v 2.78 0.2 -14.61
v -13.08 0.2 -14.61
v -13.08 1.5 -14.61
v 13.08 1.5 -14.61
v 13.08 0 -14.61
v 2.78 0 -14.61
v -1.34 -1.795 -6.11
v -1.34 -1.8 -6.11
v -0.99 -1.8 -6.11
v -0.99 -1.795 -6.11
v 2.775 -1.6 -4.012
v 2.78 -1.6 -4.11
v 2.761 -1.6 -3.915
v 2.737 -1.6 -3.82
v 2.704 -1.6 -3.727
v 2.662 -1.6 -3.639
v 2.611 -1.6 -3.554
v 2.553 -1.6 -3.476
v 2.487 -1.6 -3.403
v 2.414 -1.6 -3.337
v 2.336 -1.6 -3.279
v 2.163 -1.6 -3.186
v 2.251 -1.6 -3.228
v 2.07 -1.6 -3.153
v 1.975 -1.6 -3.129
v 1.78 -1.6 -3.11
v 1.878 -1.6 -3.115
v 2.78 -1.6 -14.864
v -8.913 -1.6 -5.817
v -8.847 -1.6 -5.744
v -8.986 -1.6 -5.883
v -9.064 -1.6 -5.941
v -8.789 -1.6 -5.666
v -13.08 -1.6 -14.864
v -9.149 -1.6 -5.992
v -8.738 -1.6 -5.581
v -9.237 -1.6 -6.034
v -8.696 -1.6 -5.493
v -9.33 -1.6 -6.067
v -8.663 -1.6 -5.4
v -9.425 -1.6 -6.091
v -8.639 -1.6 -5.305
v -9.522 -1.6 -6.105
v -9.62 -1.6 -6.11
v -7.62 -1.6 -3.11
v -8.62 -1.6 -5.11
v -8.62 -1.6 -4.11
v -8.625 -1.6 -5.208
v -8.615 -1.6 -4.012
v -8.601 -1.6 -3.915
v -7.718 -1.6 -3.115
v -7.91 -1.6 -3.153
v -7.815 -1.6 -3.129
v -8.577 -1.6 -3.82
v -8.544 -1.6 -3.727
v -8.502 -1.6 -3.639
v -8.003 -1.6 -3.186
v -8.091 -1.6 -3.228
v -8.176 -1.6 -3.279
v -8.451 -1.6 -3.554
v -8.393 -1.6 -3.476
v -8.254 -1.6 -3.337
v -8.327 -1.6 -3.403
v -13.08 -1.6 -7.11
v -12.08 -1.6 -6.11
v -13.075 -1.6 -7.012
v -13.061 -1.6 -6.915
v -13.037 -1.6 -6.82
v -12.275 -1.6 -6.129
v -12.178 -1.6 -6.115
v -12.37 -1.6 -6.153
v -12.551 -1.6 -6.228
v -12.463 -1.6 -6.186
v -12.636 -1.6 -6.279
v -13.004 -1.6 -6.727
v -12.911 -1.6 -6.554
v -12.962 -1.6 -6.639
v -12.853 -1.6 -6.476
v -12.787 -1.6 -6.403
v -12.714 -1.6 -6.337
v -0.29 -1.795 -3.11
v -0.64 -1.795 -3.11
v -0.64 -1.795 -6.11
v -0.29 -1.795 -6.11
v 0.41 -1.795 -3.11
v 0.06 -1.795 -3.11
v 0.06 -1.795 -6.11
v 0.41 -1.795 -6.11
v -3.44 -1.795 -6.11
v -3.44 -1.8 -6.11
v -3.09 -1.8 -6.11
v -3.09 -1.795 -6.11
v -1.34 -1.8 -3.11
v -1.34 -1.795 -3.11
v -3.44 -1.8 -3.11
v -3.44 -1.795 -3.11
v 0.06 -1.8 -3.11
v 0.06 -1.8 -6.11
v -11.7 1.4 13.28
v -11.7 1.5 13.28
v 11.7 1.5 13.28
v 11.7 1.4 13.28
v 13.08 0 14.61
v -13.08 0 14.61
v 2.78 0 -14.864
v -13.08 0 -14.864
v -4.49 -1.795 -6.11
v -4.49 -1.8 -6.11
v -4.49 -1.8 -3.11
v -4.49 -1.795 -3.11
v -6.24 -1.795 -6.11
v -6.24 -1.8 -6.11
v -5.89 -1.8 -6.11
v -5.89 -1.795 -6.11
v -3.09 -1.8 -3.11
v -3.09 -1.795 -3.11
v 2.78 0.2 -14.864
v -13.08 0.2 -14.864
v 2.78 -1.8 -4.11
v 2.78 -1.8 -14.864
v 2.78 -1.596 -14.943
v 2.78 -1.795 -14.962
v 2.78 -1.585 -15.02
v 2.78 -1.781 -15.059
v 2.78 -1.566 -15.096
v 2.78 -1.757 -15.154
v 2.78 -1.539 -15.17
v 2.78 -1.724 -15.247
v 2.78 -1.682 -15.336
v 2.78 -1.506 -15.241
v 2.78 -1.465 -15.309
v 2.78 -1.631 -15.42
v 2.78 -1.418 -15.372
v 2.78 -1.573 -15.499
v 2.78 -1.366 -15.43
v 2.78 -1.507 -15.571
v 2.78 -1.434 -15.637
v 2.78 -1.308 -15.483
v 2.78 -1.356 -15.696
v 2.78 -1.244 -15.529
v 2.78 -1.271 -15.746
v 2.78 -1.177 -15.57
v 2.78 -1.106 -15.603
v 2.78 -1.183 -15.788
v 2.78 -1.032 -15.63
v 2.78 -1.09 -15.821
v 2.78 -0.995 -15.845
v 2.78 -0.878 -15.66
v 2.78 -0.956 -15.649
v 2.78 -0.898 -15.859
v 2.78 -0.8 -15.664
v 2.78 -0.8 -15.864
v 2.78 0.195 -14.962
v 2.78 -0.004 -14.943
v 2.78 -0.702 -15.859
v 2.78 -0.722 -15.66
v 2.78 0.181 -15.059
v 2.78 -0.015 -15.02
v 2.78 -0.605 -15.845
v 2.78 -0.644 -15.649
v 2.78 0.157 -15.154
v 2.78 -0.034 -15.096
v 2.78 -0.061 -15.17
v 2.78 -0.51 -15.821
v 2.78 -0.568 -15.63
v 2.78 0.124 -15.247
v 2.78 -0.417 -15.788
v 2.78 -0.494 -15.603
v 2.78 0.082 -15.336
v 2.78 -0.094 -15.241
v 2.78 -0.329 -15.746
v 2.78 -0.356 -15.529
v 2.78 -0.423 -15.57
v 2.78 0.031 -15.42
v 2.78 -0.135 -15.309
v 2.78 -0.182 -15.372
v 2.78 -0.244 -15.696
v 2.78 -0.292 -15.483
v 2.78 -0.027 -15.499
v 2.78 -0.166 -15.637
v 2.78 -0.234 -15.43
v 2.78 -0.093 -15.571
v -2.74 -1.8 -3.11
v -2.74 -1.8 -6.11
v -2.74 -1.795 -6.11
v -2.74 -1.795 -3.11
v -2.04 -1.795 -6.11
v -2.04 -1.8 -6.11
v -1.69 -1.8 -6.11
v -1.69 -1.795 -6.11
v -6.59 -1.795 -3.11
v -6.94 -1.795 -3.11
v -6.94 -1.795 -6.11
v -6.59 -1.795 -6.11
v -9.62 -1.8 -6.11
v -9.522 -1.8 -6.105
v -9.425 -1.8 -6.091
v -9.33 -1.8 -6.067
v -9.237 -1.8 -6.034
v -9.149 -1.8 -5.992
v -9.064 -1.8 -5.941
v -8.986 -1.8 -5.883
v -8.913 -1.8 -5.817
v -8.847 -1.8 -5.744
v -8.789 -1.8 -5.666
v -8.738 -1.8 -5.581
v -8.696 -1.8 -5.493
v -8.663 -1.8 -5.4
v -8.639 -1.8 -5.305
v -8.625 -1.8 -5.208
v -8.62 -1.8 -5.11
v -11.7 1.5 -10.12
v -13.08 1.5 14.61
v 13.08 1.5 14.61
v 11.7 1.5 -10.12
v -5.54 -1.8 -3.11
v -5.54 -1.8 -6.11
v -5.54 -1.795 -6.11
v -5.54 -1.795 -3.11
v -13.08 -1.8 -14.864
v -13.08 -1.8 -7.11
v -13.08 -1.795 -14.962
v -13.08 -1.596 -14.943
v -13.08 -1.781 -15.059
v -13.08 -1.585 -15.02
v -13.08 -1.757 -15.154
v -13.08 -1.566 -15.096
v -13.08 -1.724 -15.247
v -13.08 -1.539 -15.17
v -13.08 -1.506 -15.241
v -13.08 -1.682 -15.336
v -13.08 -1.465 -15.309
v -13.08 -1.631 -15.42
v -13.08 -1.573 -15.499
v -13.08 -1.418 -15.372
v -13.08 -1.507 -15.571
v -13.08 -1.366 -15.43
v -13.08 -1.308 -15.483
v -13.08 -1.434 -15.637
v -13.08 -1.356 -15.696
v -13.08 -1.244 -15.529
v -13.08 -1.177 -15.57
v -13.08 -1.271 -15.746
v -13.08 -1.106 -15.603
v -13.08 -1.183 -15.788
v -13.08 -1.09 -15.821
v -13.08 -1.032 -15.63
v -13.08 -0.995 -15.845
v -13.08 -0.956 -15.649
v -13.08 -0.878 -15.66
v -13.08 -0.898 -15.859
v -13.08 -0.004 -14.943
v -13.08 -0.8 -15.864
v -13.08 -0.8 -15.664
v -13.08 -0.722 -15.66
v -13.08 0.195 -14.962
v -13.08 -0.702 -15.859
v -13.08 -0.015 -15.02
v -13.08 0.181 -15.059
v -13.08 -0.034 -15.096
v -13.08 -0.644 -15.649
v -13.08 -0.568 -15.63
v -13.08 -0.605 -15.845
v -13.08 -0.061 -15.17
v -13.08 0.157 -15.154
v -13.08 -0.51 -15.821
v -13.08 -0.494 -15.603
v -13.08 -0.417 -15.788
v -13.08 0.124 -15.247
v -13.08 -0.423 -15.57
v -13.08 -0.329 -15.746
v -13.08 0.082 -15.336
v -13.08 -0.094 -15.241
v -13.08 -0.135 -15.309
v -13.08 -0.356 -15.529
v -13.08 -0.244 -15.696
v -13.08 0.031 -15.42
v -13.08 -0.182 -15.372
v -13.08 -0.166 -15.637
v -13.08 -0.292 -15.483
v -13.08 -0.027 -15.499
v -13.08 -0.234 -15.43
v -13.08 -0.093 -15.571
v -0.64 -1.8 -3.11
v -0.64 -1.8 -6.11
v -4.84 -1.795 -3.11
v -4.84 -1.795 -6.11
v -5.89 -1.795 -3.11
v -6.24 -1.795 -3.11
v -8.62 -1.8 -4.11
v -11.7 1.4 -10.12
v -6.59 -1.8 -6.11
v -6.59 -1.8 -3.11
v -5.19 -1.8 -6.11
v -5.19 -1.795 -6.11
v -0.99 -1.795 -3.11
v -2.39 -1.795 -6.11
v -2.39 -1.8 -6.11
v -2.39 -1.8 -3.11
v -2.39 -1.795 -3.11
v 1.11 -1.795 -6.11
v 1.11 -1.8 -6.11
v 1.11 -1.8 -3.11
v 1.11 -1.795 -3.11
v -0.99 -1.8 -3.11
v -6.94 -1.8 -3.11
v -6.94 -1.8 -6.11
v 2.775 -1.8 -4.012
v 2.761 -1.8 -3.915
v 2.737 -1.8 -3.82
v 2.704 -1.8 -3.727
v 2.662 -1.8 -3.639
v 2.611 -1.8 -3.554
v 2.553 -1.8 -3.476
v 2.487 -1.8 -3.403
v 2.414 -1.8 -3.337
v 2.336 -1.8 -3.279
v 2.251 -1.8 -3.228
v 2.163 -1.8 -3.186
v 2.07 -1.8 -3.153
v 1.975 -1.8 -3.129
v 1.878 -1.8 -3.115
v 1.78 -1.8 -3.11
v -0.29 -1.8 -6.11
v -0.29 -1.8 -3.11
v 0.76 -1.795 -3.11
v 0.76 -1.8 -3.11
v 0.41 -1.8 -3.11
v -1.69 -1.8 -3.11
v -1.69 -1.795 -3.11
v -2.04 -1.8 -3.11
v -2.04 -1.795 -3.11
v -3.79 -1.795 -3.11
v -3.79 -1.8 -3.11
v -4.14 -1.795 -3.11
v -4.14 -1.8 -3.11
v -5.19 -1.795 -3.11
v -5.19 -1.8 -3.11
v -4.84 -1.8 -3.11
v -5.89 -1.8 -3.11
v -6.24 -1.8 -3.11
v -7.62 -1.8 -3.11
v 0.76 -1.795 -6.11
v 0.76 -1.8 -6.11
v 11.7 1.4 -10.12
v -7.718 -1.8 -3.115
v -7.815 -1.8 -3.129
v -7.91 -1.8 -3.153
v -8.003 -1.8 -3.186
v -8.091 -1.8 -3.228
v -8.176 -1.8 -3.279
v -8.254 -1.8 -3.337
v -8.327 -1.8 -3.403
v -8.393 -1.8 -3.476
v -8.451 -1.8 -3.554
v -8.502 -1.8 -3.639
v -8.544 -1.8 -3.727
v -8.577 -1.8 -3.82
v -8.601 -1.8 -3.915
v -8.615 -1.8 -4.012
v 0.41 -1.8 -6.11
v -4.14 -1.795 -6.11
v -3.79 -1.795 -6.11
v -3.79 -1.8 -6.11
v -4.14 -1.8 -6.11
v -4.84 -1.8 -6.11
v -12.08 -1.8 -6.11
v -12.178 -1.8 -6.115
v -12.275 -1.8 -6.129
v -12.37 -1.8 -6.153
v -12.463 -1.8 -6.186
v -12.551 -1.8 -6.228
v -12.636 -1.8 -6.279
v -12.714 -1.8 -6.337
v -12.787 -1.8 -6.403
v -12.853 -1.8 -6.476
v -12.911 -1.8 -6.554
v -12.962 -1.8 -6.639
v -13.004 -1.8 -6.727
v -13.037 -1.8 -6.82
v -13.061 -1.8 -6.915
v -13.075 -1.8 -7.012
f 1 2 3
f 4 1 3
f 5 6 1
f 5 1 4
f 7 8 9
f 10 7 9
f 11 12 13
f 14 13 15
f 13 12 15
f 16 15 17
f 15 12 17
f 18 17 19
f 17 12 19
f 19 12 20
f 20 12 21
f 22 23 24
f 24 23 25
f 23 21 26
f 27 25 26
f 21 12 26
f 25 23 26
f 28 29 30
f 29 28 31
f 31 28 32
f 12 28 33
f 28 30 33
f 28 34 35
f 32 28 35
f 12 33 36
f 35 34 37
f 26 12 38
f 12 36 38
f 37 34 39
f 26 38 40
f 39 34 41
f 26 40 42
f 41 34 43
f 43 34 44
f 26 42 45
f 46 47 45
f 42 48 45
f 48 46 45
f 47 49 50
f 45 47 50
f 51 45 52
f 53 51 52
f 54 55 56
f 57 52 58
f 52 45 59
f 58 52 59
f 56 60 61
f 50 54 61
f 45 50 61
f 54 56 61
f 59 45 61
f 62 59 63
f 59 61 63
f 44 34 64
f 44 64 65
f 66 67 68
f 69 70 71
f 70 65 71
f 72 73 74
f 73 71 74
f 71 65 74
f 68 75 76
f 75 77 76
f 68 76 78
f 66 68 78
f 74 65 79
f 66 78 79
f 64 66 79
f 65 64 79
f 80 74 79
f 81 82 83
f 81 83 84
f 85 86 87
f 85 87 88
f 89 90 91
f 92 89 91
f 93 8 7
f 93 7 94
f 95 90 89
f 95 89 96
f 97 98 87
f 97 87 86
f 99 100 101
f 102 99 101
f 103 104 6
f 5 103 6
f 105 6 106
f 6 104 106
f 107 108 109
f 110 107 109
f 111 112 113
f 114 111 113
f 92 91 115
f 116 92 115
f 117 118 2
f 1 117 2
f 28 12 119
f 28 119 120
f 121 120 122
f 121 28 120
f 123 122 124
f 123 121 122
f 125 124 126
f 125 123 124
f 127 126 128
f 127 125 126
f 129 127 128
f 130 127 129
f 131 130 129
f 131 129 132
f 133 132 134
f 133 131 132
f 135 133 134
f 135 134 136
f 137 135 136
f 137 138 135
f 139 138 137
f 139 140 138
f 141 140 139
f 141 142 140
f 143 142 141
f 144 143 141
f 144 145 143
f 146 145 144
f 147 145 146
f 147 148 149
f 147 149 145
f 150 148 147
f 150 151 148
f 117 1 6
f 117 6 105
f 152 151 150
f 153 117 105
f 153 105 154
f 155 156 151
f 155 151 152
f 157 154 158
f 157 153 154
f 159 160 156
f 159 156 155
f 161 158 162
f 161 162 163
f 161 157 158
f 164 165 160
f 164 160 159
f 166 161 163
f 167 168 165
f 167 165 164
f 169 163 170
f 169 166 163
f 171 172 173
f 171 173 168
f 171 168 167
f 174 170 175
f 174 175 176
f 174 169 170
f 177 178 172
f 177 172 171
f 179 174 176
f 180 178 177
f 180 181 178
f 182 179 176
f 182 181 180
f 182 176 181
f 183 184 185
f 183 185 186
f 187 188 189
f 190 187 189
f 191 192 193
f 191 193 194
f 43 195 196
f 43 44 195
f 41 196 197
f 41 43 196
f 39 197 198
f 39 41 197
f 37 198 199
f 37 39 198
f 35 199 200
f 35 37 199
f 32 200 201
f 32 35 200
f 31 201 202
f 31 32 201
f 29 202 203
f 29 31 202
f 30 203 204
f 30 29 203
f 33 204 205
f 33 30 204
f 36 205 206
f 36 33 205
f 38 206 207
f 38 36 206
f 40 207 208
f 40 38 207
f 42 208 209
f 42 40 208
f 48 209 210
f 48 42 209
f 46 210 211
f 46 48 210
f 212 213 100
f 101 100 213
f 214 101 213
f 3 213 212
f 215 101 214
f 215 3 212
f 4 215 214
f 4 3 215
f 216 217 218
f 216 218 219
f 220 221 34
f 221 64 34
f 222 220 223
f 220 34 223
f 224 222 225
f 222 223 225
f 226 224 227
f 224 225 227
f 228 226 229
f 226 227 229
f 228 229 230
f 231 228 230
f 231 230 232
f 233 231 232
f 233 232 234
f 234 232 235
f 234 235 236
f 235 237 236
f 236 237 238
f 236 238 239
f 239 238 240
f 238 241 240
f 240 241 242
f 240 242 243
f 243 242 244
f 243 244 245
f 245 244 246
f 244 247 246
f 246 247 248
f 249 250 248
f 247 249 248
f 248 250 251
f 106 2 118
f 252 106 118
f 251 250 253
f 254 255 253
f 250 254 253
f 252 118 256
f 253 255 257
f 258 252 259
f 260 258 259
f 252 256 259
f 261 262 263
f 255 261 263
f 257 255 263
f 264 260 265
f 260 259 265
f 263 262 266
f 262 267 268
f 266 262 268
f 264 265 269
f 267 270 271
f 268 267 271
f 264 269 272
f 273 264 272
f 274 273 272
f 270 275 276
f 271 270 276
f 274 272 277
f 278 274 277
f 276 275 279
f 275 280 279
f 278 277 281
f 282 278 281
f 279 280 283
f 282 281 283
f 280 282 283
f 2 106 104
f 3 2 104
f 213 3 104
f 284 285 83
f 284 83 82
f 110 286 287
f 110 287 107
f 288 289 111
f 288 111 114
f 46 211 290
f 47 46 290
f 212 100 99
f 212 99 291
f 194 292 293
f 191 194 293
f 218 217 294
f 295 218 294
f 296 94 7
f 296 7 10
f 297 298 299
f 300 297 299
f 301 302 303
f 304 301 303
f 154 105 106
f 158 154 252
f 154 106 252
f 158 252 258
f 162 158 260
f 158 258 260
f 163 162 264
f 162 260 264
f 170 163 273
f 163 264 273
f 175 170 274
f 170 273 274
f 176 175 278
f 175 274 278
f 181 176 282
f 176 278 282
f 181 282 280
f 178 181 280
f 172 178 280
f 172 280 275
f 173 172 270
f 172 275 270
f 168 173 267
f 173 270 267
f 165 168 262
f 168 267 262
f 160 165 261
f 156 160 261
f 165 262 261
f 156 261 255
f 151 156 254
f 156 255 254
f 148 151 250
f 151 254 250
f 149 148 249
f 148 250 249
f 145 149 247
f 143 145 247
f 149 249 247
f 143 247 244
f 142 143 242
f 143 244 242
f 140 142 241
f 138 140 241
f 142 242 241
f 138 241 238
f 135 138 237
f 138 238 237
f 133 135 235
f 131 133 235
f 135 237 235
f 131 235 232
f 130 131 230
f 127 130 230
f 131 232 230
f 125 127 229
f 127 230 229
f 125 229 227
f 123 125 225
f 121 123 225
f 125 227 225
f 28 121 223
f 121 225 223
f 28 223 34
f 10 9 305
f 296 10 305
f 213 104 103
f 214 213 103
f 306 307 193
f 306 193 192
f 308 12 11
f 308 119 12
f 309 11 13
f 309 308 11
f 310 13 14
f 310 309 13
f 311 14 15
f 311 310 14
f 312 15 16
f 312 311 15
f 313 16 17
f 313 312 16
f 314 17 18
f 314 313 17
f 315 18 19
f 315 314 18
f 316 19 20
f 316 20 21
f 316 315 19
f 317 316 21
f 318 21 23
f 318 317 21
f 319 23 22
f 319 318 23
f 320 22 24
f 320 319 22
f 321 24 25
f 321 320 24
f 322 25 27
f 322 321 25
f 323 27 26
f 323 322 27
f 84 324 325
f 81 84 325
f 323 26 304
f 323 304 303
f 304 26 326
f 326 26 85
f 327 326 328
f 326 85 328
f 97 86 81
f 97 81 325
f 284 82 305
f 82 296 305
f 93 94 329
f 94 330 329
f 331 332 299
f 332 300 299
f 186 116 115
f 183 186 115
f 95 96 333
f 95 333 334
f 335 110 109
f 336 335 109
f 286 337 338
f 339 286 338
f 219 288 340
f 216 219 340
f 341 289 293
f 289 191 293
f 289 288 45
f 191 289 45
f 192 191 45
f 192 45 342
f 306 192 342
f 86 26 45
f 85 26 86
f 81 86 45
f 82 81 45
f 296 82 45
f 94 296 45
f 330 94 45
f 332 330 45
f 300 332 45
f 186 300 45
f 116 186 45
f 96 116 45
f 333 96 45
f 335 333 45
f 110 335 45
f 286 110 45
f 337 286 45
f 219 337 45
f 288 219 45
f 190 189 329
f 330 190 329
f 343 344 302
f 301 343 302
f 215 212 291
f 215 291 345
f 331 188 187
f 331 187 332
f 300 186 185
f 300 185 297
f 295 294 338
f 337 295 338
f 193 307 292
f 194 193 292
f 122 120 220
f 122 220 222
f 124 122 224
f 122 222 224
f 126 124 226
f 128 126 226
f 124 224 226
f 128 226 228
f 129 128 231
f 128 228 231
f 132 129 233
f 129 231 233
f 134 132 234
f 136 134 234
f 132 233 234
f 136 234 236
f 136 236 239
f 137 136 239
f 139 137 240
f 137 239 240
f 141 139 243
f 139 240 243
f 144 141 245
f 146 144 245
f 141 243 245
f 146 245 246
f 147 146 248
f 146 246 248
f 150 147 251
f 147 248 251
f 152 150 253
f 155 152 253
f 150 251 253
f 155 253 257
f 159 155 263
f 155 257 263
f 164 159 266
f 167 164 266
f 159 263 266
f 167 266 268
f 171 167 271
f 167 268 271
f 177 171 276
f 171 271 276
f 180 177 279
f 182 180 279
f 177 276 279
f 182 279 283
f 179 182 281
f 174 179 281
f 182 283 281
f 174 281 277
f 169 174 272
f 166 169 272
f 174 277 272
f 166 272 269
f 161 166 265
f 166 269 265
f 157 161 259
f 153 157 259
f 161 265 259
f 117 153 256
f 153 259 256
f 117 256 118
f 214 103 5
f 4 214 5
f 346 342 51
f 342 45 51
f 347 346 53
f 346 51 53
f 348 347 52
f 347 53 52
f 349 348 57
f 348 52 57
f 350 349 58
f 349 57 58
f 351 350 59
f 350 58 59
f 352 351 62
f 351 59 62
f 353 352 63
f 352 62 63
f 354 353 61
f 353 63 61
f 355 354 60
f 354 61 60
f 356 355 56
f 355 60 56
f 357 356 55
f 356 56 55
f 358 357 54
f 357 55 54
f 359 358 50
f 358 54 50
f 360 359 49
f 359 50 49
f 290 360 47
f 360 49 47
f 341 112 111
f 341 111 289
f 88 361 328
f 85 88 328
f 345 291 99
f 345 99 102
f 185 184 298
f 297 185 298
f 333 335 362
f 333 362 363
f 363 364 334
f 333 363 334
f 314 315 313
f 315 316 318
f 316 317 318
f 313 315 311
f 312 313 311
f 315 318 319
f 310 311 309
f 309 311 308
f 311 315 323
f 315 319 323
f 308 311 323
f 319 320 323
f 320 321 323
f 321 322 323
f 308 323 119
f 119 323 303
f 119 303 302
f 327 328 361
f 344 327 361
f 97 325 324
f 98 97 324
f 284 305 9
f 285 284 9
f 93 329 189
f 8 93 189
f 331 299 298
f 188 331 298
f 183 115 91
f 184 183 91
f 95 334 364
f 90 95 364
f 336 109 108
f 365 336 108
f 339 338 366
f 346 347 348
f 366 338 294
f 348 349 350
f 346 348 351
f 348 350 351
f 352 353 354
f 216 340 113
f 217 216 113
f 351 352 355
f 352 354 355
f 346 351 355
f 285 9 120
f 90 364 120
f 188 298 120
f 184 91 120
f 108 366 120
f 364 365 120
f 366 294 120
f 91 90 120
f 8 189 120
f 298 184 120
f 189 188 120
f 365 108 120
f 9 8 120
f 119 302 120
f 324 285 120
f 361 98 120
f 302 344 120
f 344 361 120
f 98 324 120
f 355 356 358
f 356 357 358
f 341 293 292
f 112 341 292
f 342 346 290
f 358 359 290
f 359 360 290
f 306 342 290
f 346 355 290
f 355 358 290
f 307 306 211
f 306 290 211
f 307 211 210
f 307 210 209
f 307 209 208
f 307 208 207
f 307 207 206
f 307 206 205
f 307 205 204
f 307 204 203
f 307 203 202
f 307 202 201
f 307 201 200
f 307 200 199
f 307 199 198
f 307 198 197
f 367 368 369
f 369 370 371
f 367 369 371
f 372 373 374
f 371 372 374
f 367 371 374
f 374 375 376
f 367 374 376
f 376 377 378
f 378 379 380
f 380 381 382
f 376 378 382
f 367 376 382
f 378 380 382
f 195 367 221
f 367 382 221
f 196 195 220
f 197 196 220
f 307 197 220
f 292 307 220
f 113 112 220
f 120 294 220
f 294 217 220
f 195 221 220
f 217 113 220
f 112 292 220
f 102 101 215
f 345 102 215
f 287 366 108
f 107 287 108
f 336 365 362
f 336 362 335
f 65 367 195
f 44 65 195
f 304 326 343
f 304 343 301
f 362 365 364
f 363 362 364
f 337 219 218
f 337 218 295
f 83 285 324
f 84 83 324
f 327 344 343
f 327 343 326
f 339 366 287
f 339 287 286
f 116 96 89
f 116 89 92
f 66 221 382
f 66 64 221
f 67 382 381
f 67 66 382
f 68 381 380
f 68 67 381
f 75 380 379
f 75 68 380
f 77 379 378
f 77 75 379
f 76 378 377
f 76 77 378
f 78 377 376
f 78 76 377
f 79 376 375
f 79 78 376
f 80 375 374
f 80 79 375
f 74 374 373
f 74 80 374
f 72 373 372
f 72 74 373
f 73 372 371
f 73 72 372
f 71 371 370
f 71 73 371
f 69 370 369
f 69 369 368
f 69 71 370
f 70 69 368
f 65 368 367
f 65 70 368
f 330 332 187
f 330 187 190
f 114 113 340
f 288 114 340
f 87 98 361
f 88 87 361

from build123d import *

# Parameters (mm, degrees)
SKETCH_1_W          = 26.16
SKETCH_1_H          = 29.22
EXTRUDE_1_DEPTH     = 1.5
EXTRUDE_2_DEPTH     = 15.86
SKETCH_4_W          = 4.46
SKETCH_4_H          = 3
CUT_EXTRUDE_1_DEPTH = 1
FILLET_2_R          = 1
SKETCH_5_W          = 23.4
SKETCH_5_H          = 23.4
CUT_EXTRUDE_2_DEPTH = 0.1
SKETCH_6_W          = 0.35
SKETCH_6_H          = 3
CUT_EXTRUDE_3_DEPTH = 0.005


with BuildPart() as part:
    # 草图1 → 凸台-拉伸1 (new body)
    with BuildSketch(Plane(origin=(0, 0, 0), x_dir=(1, 0, 0), z_dir=(0, 1, 0))):
        Rectangle(SKETCH_1_W, SKETCH_1_H)
    extrude(amount=EXTRUDE_1_DEPTH)

    # 草图3 → 凸台-拉伸2 (add)
    with BuildSketch(Plane.ZY.offset(13.08)):
        with BuildLine():
            Line((-14.61, 0), (-14.864156079, 0))
            ThreePointArc((-14.864156079, 0), (-15.664156079, -0.8), (-14.864156079, -1.6))
            Line((-14.864156079, -1.6), (-3.11, -1.6))
            Line((-3.11, -1.6), (-3.11, -1.8))
            Line((-3.11, -1.8), (-14.864156079, -1.8))
            ThreePointArc((-14.864156079, -1.8), (-15.864156079, -0.8), (-14.864156079, 0.2))
            Line((-14.864156079, 0.2), (-14.61, 0.2))
            Line((-14.61, 0.2), (-14.61, 0))
        make_face()
    extrude(amount=-EXTRUDE_2_DEPTH)

    # 草图4 → 切除-拉伸1 (cut)
    with BuildSketch(Plane.XZ.offset(1.8)):
        with Locations((-10.85, -4.61)):
            Rectangle(SKETCH_4_W, SKETCH_4_H)
    extrude(amount=-CUT_EXTRUDE_1_DEPTH, mode=Mode.SUBTRACT)

    # 圆角2
    fillet_2_edges = [part.edges().sort_by_distance(p)[0] for p in [
        (2.78, -1.7, -3.11),
        (-13.08, -1.7, -6.11),
        (-8.62, -1.7, -3.11),
        (-8.62, -1.7, -6.11),
    ]]
    fillet(fillet_2_edges, radius=FILLET_2_R)

    # 草图5 → 切除-拉伸2 (cut)
    with BuildSketch(Plane(origin=(0, 1.5, 0), x_dir=(1, 0, 0), z_dir=(0, 1, 0))):
        with Locations((0, -1.58)):
            Rectangle(SKETCH_5_W, SKETCH_5_H)
    extrude(amount=-CUT_EXTRUDE_2_DEPTH, mode=Mode.SUBTRACT)

    # 草图6 → 切除-拉伸3 (cut)
    with BuildSketch(Plane.XZ.offset(1.8)):
        with Locations((-6.765, -4.61)):
            Rectangle(SKETCH_6_W, SKETCH_6_H)
        with Locations((-6.065, -4.61)):
            Rectangle(SKETCH_6_W, SKETCH_6_H)
        with Locations((-5.365, -4.61)):
            Rectangle(SKETCH_6_W, SKETCH_6_H)
        with Locations((-4.665, -4.61)):
            Rectangle(SKETCH_6_W, SKETCH_6_H)
        with Locations((-3.965, -4.61)):
            Rectangle(SKETCH_6_W, SKETCH_6_H)
        with Locations((-3.265, -4.61)):
            Rectangle(SKETCH_6_W, SKETCH_6_H)
        with Locations((-2.565, -4.61)):
            Rectangle(SKETCH_6_W, SKETCH_6_H)
        with Locations((-1.865, -4.61)):
            Rectangle(SKETCH_6_W, SKETCH_6_H)
        with Locations((-1.165, -4.61)):
            Rectangle(SKETCH_6_W, SKETCH_6_H)
        with Locations((-0.465, -4.61)):
            Rectangle(SKETCH_6_W, SKETCH_6_H)
        with Locations((0.235, -4.61)):
            Rectangle(SKETCH_6_W, SKETCH_6_H)
        with Locations((0.935, -4.61)):
            Rectangle(SKETCH_6_W, SKETCH_6_H)
    extrude(amount=-CUT_EXTRUDE_3_DEPTH, mode=Mode.SUBTRACT)


solid = part.part
